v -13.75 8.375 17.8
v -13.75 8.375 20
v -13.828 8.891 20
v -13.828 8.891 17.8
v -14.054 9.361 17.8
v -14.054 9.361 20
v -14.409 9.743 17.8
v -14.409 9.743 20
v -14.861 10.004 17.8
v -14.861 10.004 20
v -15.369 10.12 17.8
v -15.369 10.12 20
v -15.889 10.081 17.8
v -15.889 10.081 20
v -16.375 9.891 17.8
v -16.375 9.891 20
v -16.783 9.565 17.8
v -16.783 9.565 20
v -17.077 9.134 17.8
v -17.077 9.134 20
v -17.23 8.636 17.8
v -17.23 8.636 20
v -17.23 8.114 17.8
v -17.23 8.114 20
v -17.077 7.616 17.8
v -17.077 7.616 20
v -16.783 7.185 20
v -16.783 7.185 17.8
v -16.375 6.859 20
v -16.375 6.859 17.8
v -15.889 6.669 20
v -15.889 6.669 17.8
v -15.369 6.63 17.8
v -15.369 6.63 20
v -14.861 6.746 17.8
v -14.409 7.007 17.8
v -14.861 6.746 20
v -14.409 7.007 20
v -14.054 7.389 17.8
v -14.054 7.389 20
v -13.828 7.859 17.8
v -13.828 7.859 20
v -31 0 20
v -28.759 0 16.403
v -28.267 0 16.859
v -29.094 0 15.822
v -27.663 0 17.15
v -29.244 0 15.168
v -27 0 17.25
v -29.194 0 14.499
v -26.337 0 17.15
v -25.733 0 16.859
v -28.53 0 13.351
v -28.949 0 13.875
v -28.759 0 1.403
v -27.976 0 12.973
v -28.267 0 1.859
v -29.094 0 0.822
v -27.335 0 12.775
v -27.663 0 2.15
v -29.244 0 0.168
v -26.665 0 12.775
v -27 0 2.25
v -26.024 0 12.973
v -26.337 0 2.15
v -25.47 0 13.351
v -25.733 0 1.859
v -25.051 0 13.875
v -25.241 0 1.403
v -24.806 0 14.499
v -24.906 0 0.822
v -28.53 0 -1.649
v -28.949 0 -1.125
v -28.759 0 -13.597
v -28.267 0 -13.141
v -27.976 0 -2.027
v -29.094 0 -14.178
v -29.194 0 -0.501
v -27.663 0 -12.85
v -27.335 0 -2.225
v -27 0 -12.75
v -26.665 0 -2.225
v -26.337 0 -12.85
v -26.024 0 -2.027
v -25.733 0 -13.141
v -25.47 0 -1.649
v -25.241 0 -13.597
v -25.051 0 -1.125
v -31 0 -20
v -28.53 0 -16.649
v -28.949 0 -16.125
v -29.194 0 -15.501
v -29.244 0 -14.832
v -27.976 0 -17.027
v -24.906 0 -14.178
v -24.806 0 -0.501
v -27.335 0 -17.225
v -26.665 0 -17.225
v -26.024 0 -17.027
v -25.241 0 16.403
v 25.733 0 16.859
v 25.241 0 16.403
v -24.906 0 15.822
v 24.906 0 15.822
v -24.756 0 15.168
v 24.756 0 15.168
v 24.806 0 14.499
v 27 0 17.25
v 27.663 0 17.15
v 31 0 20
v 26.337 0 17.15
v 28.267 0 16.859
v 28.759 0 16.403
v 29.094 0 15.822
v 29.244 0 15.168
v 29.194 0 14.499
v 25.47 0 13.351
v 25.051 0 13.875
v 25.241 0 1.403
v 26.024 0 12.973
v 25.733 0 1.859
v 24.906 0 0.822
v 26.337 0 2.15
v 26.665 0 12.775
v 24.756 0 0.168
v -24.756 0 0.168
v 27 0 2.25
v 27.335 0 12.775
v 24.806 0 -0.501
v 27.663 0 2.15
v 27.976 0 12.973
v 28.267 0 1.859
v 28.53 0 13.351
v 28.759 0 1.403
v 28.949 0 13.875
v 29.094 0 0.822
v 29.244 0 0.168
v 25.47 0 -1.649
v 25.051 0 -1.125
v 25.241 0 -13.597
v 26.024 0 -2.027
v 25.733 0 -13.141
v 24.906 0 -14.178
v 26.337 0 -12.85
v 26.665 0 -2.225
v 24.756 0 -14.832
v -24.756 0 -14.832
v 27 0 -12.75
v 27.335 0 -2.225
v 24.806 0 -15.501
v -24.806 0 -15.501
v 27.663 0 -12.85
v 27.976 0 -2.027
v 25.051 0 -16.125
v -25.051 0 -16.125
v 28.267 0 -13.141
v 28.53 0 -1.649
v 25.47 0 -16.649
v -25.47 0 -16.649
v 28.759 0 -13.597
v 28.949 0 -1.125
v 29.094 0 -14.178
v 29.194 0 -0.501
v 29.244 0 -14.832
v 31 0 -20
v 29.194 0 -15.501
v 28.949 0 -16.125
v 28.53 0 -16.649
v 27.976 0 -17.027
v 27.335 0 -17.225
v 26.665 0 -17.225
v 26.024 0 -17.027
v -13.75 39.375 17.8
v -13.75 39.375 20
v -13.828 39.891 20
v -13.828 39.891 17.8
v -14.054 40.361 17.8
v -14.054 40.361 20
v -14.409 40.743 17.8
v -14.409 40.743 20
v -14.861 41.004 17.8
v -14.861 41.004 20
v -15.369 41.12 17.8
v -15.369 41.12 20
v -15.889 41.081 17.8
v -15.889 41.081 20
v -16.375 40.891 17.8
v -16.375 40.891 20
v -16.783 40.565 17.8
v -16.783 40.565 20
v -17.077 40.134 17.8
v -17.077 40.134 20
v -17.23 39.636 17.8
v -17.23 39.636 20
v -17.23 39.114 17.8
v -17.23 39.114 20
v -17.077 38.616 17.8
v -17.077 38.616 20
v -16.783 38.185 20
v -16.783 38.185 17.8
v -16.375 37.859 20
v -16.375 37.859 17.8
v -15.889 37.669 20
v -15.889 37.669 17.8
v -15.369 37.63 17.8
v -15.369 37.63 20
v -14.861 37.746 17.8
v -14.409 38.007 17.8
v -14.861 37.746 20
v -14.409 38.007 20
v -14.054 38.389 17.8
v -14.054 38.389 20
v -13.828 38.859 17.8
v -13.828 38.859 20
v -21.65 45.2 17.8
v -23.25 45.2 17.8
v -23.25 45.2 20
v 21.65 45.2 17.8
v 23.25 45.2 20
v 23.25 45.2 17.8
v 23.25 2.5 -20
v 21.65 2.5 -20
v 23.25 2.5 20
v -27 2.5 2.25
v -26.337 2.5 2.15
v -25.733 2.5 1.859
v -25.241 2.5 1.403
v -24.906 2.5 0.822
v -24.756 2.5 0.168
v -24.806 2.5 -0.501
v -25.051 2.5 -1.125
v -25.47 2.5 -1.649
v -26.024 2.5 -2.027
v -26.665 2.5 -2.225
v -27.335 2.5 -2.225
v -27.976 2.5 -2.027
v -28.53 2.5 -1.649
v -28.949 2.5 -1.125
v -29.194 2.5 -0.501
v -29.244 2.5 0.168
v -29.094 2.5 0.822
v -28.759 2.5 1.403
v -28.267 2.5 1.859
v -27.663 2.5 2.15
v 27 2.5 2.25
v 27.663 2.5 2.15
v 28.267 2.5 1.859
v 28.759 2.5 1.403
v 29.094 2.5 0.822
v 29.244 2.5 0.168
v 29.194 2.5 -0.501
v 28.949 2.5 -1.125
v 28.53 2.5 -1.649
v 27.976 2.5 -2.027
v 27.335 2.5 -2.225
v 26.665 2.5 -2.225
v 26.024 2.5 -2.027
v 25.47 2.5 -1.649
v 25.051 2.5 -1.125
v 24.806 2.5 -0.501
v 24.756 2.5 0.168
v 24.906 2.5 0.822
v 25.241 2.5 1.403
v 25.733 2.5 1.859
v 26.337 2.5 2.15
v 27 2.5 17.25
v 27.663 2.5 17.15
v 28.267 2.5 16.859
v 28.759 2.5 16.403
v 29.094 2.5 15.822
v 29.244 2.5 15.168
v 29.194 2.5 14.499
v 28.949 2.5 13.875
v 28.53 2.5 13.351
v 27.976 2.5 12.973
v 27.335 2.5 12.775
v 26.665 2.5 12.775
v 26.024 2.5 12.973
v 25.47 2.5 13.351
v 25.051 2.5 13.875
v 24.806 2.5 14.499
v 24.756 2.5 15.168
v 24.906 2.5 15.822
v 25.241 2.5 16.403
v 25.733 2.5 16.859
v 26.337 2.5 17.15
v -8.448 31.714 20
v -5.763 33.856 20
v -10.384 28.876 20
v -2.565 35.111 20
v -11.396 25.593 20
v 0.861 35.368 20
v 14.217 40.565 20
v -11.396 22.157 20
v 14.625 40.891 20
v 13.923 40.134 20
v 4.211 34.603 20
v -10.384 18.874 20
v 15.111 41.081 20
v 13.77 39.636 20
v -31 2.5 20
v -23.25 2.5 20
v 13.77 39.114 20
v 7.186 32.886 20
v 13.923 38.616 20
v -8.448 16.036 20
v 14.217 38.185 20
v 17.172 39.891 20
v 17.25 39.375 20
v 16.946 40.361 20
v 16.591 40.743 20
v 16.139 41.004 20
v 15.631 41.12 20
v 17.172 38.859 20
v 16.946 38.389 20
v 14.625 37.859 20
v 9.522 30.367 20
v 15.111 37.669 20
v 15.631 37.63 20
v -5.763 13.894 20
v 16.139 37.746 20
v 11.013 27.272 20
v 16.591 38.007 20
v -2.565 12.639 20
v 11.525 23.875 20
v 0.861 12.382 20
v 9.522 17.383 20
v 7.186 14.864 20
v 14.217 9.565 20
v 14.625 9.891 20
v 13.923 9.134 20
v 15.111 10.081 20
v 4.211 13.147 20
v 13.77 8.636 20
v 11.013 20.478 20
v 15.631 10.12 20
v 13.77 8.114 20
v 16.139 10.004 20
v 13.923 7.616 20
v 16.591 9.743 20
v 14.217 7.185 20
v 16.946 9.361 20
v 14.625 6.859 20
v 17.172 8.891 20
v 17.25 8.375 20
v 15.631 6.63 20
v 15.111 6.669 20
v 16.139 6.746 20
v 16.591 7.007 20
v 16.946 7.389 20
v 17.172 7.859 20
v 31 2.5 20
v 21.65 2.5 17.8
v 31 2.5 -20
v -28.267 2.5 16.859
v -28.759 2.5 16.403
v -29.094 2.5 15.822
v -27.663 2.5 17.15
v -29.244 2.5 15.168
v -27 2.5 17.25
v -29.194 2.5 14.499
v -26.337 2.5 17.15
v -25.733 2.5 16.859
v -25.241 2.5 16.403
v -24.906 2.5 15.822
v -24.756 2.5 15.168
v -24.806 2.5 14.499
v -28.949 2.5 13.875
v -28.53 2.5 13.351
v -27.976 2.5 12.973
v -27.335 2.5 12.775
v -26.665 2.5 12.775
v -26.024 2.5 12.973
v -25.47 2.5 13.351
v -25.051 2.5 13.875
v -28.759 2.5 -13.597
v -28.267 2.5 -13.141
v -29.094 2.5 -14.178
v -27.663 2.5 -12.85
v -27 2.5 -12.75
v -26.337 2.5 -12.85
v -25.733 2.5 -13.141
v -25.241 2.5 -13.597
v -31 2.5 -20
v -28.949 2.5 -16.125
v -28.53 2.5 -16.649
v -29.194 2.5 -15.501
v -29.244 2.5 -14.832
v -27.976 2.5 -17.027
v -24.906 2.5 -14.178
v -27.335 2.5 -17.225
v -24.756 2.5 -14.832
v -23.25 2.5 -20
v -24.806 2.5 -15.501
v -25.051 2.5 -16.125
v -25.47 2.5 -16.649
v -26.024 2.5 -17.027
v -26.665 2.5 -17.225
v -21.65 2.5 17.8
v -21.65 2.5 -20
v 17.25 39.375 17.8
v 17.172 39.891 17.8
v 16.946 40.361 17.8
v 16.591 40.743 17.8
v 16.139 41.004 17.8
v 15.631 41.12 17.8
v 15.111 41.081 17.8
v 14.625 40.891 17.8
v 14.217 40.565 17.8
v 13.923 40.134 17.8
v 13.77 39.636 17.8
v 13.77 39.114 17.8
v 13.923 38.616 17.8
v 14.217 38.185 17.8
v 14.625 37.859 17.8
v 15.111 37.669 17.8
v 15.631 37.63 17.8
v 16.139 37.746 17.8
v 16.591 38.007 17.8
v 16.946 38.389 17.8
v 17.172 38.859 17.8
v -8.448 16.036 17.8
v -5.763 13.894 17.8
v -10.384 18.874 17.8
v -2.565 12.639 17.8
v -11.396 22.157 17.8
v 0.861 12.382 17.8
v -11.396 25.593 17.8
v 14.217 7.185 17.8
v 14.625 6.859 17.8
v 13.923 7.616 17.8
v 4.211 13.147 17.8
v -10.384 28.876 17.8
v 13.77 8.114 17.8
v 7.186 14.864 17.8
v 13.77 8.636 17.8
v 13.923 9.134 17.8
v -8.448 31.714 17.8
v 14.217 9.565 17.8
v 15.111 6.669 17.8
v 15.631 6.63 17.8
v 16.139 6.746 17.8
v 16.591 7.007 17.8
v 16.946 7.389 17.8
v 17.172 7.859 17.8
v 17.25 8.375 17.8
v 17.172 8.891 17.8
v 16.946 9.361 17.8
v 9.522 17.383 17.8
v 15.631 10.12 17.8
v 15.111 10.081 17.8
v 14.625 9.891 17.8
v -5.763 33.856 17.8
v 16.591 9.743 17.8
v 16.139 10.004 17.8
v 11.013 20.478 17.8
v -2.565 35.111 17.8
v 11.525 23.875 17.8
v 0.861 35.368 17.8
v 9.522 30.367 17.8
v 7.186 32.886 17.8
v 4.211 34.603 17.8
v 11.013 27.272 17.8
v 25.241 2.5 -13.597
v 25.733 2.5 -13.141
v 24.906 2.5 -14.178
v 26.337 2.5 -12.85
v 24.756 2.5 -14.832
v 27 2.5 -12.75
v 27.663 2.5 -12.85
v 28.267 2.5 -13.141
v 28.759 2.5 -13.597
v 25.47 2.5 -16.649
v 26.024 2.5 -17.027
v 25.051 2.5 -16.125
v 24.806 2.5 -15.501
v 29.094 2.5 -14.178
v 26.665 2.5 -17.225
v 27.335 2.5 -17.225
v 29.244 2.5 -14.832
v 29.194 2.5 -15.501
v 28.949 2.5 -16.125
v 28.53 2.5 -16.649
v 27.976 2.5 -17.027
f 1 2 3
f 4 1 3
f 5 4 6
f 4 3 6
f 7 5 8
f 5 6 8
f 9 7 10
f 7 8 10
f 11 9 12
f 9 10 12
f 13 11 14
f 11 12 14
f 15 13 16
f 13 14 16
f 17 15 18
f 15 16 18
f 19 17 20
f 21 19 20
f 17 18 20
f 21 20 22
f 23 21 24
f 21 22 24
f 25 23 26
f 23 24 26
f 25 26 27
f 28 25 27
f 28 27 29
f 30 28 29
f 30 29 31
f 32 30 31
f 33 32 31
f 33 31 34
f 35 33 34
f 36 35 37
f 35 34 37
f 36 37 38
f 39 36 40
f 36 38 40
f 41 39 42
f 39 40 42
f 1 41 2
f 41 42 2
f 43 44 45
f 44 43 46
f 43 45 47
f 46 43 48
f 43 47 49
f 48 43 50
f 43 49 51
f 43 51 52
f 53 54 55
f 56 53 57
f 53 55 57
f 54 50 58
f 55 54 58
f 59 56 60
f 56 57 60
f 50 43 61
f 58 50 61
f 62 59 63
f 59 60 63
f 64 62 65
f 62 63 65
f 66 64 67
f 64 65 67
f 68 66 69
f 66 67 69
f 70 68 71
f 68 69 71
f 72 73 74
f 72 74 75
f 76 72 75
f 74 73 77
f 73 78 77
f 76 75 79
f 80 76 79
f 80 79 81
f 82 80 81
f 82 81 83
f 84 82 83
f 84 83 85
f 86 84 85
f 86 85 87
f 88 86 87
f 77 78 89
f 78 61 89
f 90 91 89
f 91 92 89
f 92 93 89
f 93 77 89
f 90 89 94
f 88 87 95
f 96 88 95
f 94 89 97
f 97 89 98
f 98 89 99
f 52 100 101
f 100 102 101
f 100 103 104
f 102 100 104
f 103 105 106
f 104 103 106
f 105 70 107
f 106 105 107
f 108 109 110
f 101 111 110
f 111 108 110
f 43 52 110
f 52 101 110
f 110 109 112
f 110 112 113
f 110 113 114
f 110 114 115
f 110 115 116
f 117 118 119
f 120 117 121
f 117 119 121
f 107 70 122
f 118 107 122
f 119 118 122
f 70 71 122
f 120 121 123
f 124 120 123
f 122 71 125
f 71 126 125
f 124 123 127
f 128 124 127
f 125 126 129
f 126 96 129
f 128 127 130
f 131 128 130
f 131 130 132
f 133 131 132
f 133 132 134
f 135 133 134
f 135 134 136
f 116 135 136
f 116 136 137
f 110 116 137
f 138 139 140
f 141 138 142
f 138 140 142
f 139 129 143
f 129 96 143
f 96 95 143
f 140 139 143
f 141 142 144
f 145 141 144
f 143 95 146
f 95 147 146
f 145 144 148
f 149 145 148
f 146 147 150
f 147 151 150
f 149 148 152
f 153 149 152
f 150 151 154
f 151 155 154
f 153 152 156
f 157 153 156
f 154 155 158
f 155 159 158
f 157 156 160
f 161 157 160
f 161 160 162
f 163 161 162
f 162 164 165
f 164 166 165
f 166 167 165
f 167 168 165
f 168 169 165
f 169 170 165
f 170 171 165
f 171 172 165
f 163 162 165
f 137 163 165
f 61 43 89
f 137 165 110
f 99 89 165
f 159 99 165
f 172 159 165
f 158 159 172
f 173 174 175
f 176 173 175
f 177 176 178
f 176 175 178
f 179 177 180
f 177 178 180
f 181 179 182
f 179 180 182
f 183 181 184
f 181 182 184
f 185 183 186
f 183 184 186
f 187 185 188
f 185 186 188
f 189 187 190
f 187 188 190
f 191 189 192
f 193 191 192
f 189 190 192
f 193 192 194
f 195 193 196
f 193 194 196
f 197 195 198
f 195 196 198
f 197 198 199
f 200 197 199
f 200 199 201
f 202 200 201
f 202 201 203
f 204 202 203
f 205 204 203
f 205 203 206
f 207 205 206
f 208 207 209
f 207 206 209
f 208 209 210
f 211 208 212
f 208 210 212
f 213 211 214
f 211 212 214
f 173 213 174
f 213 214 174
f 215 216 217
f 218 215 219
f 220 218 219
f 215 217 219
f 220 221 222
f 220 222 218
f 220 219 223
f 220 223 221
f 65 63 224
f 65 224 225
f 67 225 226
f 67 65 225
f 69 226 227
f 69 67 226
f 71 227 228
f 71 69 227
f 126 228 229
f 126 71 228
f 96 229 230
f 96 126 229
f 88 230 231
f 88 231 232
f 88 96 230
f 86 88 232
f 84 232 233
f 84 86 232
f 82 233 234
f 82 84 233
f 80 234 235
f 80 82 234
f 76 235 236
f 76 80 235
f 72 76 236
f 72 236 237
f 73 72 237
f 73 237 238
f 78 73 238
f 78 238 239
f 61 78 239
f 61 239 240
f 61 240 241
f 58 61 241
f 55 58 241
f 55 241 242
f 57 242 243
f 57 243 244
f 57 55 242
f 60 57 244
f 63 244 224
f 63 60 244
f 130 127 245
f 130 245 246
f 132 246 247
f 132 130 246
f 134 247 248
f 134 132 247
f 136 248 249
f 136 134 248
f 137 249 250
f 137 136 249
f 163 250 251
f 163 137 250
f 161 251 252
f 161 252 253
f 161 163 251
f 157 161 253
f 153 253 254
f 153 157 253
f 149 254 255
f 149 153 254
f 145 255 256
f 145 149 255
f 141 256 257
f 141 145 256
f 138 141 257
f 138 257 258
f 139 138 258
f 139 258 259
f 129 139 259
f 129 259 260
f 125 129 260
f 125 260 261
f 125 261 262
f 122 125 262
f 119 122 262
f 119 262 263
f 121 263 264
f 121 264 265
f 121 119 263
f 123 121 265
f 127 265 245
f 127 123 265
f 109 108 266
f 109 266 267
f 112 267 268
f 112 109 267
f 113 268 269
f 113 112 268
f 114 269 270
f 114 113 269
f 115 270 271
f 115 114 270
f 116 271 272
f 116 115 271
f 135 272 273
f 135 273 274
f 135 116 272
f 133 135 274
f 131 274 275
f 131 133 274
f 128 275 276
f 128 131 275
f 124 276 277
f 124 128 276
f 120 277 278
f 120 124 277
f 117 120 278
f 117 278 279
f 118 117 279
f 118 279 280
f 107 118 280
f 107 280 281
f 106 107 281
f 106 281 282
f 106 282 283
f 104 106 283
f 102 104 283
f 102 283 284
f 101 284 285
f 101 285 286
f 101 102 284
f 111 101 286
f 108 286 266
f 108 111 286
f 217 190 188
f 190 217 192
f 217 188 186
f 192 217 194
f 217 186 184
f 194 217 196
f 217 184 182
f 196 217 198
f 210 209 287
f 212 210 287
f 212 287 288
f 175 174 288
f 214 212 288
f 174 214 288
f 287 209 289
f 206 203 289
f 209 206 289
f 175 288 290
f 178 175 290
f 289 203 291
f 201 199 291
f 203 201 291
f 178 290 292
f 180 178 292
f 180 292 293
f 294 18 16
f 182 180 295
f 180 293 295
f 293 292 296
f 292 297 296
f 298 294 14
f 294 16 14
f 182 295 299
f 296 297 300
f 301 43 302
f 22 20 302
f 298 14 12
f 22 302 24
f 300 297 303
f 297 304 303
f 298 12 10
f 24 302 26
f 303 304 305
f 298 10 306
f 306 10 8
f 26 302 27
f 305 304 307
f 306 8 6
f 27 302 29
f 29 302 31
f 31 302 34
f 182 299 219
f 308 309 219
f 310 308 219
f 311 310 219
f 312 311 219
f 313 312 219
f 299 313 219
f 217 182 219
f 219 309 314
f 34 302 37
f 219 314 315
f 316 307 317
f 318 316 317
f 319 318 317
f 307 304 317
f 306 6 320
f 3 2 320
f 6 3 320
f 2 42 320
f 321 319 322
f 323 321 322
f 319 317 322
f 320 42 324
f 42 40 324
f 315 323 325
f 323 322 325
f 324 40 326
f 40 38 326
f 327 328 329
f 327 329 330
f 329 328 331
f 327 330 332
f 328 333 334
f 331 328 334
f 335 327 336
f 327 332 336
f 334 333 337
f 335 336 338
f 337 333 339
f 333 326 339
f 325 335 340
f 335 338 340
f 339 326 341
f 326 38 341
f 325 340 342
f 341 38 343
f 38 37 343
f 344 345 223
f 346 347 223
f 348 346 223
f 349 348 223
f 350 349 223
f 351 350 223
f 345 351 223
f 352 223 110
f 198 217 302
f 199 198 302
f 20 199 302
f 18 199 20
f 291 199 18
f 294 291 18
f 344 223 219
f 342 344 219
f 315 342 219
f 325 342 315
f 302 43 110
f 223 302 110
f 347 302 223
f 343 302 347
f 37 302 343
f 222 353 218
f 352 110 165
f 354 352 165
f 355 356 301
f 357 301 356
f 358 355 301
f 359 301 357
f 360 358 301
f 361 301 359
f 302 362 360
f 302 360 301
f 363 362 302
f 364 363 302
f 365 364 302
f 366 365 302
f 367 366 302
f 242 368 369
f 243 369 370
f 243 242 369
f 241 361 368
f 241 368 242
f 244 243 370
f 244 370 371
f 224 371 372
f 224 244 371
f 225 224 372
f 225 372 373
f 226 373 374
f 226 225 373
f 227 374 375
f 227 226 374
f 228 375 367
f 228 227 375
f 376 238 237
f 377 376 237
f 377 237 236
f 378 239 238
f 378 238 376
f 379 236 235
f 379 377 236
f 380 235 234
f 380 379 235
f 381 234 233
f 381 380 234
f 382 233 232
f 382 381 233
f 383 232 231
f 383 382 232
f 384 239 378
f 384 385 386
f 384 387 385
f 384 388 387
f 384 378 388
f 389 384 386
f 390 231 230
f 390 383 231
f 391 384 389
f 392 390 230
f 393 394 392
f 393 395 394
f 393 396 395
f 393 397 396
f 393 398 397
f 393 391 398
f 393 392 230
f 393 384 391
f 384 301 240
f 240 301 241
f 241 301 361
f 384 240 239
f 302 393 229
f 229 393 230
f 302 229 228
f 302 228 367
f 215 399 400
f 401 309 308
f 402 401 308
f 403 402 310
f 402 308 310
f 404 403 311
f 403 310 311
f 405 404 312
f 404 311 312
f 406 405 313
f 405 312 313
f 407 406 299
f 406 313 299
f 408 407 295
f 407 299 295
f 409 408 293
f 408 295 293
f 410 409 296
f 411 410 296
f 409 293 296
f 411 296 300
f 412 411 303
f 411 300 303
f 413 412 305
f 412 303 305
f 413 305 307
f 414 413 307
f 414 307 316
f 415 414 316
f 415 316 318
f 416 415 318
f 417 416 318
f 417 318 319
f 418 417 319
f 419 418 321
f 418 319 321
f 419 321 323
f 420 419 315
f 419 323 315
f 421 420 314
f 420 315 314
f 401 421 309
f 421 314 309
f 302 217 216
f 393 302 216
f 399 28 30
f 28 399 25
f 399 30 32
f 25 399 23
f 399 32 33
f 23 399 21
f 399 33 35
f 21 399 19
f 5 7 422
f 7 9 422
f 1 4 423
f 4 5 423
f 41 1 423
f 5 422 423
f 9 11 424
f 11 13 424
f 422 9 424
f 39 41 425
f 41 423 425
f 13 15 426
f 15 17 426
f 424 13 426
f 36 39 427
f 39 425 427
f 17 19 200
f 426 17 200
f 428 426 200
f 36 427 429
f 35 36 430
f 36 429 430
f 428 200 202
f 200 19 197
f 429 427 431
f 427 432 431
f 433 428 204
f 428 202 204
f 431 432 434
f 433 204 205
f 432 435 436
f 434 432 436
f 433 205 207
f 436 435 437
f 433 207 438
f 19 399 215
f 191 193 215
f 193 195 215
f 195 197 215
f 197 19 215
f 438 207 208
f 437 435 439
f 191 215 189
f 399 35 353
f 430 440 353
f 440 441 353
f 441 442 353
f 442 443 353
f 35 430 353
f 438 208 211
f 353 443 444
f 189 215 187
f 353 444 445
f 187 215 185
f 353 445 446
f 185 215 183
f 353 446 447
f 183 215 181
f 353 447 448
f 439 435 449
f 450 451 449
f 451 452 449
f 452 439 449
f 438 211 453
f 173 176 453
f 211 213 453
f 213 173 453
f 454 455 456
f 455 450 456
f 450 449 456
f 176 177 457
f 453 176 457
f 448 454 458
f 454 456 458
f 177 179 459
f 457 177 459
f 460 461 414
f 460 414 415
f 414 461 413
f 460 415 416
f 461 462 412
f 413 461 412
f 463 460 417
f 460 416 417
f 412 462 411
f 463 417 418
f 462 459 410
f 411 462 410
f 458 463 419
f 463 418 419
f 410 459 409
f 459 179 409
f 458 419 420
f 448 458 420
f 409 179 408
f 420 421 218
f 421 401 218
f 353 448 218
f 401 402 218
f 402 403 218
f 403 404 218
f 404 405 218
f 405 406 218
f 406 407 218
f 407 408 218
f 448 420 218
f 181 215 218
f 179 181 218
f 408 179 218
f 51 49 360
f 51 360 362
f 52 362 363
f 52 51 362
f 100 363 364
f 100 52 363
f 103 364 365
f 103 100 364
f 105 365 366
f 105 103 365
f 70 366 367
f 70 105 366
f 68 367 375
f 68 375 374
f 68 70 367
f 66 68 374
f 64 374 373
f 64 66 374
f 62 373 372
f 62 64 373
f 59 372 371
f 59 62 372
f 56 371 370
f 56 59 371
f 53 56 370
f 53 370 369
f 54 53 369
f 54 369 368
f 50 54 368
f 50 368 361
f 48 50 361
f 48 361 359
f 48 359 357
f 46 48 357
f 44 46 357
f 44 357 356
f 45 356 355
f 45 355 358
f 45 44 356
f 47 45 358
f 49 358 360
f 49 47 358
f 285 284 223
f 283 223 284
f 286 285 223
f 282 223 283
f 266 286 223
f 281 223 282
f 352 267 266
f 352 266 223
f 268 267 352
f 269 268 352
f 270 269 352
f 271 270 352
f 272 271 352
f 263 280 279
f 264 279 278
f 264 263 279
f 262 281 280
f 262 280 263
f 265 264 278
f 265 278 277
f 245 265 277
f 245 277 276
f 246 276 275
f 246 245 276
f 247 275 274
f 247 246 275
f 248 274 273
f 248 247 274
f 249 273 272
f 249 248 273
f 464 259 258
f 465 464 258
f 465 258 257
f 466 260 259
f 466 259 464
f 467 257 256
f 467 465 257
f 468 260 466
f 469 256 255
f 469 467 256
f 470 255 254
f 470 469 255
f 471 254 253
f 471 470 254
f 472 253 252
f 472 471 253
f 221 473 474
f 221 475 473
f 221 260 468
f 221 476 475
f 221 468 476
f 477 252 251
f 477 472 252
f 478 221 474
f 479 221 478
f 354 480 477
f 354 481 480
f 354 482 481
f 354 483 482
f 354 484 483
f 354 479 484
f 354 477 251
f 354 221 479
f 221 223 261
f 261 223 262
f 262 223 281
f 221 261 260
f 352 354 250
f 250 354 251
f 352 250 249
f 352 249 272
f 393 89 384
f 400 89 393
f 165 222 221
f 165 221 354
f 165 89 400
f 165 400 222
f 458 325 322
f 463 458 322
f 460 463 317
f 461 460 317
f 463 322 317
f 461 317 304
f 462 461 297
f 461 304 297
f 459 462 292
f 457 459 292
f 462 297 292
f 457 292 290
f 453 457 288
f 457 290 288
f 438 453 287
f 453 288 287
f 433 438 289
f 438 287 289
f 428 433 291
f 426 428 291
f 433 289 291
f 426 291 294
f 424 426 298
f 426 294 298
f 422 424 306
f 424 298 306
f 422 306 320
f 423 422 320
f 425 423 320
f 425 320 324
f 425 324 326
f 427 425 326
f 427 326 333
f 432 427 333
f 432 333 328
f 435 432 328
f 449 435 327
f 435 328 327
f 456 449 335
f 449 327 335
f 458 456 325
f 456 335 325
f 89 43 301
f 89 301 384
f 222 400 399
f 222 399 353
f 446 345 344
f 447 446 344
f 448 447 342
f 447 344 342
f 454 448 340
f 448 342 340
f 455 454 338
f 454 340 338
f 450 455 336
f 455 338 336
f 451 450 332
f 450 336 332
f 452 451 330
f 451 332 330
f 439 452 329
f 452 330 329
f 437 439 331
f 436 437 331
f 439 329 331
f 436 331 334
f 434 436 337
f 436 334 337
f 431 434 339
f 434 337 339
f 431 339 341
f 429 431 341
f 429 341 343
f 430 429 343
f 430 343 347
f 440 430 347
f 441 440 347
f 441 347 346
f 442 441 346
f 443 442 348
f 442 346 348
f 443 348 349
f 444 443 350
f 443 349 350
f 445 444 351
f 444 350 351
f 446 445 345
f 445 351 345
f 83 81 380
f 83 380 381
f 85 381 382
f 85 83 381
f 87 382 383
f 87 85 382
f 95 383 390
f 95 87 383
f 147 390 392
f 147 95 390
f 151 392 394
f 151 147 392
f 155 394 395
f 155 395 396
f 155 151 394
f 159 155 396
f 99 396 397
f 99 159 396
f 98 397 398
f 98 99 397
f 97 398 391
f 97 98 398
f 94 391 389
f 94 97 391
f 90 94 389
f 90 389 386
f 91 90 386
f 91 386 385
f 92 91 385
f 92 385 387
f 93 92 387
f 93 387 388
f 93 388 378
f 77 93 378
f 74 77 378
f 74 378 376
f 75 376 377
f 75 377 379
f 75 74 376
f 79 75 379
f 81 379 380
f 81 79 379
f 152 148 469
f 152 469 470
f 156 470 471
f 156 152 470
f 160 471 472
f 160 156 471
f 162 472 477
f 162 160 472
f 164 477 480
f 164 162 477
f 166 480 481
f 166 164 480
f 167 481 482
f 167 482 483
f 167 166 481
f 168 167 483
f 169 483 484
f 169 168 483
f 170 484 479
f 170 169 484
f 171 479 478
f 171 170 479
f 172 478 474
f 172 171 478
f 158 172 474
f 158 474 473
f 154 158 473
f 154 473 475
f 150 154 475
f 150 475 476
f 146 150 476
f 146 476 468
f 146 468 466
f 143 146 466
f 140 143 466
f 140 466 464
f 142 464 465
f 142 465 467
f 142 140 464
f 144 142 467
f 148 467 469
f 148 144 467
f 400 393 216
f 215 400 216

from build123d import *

# Parameters (mm, degrees)
SKETCH_1_W      = 62
SKETCH_1_H      = 40
SKETCH_1_R      = 2.25
EXTRUDE_1_DEPTH = 2.5
SKETCH_2_W      = 46.5
SKETCH_2_H      = 42.7
SKETCH_2_R      = 11.525
SKETCH_2_R_2    = 1.75
EXTRUDE_2_DEPTH = 2.2
EXTRUDE_3_DEPTH = 1.6
EXTRUDE_4_DEPTH = 1.6


with BuildPart() as part:
    # Эскиз1 → Бобышка-Вытянуть1 (new body)
    with BuildSketch(Plane(origin=(0, 0, 0), x_dir=(1, 0, 0), z_dir=(0, 1, 0))):
        Rectangle(SKETCH_1_W, SKETCH_1_H)
        with Locations(Location((-27, 0, 0), (0, 0, 270))):
            Circle(SKETCH_1_R, mode=Mode.SUBTRACT)
        with Locations(Location((27, 0, 0), (0, 0, 270))):
            Circle(SKETCH_1_R, mode=Mode.SUBTRACT)
        with Locations(Location((-27, 15, 0), (0, 0, 270))):
            Circle(SKETCH_1_R, mode=Mode.SUBTRACT)
        with Locations(Location((27, 15, 0), (0, 0, 270))):
            Circle(SKETCH_1_R, mode=Mode.SUBTRACT)
        with Locations(Location((-27, -15, 0), (0, 0, 270))):
            Circle(SKETCH_1_R, mode=Mode.SUBTRACT)
        with Locations(Location((27, -15, 0), (0, 0, 270))):
            Circle(SKETCH_1_R, mode=Mode.SUBTRACT)
    extrude(amount=EXTRUDE_1_DEPTH)

    # Эскиз2 → Бобышка-Вытянуть2 (add)
    with BuildSketch(Plane.XY.offset(20)):
        with Locations((0, 23.85)):
            Rectangle(SKETCH_2_W, SKETCH_2_H)
        with Locations((0, 23.875)):
            Circle(SKETCH_2_R, mode=Mode.SUBTRACT)
        with Locations((15.5, 39.375)):
            Circle(SKETCH_2_R_2, mode=Mode.SUBTRACT)
        with Locations((15.5, 8.375)):
            Circle(SKETCH_2_R_2, mode=Mode.SUBTRACT)
        with Locations((-15.5, 8.375)):
            Circle(SKETCH_2_R_2, mode=Mode.SUBTRACT)
        with Locations((-15.5, 39.375)):
            Circle(SKETCH_2_R_2, mode=Mode.SUBTRACT)
    extrude(amount=-EXTRUDE_2_DEPTH)

    # Эскиз3 → Бобышка-Вытянуть3 (add)
    with BuildSketch(Plane.ZY.offset(23.25)):
        Polygon((-20, 2.5), (17.8, 45.2), (17.8, 2.5), align=None)
    extrude(amount=-EXTRUDE_3_DEPTH)

    # Эскиз4 → Бобышка-Вытянуть4 (add)
    with BuildSketch(Plane(origin=(23.25, 0, 0), x_dir=(0, 0, -1), z_dir=(1, 0, 0))):
        Polygon((-17.8, 2.5), (20, 2.5), (-17.8, 45.2), align=None)
    extrude(amount=-EXTRUDE_4_DEPTH)


solid = part.part
